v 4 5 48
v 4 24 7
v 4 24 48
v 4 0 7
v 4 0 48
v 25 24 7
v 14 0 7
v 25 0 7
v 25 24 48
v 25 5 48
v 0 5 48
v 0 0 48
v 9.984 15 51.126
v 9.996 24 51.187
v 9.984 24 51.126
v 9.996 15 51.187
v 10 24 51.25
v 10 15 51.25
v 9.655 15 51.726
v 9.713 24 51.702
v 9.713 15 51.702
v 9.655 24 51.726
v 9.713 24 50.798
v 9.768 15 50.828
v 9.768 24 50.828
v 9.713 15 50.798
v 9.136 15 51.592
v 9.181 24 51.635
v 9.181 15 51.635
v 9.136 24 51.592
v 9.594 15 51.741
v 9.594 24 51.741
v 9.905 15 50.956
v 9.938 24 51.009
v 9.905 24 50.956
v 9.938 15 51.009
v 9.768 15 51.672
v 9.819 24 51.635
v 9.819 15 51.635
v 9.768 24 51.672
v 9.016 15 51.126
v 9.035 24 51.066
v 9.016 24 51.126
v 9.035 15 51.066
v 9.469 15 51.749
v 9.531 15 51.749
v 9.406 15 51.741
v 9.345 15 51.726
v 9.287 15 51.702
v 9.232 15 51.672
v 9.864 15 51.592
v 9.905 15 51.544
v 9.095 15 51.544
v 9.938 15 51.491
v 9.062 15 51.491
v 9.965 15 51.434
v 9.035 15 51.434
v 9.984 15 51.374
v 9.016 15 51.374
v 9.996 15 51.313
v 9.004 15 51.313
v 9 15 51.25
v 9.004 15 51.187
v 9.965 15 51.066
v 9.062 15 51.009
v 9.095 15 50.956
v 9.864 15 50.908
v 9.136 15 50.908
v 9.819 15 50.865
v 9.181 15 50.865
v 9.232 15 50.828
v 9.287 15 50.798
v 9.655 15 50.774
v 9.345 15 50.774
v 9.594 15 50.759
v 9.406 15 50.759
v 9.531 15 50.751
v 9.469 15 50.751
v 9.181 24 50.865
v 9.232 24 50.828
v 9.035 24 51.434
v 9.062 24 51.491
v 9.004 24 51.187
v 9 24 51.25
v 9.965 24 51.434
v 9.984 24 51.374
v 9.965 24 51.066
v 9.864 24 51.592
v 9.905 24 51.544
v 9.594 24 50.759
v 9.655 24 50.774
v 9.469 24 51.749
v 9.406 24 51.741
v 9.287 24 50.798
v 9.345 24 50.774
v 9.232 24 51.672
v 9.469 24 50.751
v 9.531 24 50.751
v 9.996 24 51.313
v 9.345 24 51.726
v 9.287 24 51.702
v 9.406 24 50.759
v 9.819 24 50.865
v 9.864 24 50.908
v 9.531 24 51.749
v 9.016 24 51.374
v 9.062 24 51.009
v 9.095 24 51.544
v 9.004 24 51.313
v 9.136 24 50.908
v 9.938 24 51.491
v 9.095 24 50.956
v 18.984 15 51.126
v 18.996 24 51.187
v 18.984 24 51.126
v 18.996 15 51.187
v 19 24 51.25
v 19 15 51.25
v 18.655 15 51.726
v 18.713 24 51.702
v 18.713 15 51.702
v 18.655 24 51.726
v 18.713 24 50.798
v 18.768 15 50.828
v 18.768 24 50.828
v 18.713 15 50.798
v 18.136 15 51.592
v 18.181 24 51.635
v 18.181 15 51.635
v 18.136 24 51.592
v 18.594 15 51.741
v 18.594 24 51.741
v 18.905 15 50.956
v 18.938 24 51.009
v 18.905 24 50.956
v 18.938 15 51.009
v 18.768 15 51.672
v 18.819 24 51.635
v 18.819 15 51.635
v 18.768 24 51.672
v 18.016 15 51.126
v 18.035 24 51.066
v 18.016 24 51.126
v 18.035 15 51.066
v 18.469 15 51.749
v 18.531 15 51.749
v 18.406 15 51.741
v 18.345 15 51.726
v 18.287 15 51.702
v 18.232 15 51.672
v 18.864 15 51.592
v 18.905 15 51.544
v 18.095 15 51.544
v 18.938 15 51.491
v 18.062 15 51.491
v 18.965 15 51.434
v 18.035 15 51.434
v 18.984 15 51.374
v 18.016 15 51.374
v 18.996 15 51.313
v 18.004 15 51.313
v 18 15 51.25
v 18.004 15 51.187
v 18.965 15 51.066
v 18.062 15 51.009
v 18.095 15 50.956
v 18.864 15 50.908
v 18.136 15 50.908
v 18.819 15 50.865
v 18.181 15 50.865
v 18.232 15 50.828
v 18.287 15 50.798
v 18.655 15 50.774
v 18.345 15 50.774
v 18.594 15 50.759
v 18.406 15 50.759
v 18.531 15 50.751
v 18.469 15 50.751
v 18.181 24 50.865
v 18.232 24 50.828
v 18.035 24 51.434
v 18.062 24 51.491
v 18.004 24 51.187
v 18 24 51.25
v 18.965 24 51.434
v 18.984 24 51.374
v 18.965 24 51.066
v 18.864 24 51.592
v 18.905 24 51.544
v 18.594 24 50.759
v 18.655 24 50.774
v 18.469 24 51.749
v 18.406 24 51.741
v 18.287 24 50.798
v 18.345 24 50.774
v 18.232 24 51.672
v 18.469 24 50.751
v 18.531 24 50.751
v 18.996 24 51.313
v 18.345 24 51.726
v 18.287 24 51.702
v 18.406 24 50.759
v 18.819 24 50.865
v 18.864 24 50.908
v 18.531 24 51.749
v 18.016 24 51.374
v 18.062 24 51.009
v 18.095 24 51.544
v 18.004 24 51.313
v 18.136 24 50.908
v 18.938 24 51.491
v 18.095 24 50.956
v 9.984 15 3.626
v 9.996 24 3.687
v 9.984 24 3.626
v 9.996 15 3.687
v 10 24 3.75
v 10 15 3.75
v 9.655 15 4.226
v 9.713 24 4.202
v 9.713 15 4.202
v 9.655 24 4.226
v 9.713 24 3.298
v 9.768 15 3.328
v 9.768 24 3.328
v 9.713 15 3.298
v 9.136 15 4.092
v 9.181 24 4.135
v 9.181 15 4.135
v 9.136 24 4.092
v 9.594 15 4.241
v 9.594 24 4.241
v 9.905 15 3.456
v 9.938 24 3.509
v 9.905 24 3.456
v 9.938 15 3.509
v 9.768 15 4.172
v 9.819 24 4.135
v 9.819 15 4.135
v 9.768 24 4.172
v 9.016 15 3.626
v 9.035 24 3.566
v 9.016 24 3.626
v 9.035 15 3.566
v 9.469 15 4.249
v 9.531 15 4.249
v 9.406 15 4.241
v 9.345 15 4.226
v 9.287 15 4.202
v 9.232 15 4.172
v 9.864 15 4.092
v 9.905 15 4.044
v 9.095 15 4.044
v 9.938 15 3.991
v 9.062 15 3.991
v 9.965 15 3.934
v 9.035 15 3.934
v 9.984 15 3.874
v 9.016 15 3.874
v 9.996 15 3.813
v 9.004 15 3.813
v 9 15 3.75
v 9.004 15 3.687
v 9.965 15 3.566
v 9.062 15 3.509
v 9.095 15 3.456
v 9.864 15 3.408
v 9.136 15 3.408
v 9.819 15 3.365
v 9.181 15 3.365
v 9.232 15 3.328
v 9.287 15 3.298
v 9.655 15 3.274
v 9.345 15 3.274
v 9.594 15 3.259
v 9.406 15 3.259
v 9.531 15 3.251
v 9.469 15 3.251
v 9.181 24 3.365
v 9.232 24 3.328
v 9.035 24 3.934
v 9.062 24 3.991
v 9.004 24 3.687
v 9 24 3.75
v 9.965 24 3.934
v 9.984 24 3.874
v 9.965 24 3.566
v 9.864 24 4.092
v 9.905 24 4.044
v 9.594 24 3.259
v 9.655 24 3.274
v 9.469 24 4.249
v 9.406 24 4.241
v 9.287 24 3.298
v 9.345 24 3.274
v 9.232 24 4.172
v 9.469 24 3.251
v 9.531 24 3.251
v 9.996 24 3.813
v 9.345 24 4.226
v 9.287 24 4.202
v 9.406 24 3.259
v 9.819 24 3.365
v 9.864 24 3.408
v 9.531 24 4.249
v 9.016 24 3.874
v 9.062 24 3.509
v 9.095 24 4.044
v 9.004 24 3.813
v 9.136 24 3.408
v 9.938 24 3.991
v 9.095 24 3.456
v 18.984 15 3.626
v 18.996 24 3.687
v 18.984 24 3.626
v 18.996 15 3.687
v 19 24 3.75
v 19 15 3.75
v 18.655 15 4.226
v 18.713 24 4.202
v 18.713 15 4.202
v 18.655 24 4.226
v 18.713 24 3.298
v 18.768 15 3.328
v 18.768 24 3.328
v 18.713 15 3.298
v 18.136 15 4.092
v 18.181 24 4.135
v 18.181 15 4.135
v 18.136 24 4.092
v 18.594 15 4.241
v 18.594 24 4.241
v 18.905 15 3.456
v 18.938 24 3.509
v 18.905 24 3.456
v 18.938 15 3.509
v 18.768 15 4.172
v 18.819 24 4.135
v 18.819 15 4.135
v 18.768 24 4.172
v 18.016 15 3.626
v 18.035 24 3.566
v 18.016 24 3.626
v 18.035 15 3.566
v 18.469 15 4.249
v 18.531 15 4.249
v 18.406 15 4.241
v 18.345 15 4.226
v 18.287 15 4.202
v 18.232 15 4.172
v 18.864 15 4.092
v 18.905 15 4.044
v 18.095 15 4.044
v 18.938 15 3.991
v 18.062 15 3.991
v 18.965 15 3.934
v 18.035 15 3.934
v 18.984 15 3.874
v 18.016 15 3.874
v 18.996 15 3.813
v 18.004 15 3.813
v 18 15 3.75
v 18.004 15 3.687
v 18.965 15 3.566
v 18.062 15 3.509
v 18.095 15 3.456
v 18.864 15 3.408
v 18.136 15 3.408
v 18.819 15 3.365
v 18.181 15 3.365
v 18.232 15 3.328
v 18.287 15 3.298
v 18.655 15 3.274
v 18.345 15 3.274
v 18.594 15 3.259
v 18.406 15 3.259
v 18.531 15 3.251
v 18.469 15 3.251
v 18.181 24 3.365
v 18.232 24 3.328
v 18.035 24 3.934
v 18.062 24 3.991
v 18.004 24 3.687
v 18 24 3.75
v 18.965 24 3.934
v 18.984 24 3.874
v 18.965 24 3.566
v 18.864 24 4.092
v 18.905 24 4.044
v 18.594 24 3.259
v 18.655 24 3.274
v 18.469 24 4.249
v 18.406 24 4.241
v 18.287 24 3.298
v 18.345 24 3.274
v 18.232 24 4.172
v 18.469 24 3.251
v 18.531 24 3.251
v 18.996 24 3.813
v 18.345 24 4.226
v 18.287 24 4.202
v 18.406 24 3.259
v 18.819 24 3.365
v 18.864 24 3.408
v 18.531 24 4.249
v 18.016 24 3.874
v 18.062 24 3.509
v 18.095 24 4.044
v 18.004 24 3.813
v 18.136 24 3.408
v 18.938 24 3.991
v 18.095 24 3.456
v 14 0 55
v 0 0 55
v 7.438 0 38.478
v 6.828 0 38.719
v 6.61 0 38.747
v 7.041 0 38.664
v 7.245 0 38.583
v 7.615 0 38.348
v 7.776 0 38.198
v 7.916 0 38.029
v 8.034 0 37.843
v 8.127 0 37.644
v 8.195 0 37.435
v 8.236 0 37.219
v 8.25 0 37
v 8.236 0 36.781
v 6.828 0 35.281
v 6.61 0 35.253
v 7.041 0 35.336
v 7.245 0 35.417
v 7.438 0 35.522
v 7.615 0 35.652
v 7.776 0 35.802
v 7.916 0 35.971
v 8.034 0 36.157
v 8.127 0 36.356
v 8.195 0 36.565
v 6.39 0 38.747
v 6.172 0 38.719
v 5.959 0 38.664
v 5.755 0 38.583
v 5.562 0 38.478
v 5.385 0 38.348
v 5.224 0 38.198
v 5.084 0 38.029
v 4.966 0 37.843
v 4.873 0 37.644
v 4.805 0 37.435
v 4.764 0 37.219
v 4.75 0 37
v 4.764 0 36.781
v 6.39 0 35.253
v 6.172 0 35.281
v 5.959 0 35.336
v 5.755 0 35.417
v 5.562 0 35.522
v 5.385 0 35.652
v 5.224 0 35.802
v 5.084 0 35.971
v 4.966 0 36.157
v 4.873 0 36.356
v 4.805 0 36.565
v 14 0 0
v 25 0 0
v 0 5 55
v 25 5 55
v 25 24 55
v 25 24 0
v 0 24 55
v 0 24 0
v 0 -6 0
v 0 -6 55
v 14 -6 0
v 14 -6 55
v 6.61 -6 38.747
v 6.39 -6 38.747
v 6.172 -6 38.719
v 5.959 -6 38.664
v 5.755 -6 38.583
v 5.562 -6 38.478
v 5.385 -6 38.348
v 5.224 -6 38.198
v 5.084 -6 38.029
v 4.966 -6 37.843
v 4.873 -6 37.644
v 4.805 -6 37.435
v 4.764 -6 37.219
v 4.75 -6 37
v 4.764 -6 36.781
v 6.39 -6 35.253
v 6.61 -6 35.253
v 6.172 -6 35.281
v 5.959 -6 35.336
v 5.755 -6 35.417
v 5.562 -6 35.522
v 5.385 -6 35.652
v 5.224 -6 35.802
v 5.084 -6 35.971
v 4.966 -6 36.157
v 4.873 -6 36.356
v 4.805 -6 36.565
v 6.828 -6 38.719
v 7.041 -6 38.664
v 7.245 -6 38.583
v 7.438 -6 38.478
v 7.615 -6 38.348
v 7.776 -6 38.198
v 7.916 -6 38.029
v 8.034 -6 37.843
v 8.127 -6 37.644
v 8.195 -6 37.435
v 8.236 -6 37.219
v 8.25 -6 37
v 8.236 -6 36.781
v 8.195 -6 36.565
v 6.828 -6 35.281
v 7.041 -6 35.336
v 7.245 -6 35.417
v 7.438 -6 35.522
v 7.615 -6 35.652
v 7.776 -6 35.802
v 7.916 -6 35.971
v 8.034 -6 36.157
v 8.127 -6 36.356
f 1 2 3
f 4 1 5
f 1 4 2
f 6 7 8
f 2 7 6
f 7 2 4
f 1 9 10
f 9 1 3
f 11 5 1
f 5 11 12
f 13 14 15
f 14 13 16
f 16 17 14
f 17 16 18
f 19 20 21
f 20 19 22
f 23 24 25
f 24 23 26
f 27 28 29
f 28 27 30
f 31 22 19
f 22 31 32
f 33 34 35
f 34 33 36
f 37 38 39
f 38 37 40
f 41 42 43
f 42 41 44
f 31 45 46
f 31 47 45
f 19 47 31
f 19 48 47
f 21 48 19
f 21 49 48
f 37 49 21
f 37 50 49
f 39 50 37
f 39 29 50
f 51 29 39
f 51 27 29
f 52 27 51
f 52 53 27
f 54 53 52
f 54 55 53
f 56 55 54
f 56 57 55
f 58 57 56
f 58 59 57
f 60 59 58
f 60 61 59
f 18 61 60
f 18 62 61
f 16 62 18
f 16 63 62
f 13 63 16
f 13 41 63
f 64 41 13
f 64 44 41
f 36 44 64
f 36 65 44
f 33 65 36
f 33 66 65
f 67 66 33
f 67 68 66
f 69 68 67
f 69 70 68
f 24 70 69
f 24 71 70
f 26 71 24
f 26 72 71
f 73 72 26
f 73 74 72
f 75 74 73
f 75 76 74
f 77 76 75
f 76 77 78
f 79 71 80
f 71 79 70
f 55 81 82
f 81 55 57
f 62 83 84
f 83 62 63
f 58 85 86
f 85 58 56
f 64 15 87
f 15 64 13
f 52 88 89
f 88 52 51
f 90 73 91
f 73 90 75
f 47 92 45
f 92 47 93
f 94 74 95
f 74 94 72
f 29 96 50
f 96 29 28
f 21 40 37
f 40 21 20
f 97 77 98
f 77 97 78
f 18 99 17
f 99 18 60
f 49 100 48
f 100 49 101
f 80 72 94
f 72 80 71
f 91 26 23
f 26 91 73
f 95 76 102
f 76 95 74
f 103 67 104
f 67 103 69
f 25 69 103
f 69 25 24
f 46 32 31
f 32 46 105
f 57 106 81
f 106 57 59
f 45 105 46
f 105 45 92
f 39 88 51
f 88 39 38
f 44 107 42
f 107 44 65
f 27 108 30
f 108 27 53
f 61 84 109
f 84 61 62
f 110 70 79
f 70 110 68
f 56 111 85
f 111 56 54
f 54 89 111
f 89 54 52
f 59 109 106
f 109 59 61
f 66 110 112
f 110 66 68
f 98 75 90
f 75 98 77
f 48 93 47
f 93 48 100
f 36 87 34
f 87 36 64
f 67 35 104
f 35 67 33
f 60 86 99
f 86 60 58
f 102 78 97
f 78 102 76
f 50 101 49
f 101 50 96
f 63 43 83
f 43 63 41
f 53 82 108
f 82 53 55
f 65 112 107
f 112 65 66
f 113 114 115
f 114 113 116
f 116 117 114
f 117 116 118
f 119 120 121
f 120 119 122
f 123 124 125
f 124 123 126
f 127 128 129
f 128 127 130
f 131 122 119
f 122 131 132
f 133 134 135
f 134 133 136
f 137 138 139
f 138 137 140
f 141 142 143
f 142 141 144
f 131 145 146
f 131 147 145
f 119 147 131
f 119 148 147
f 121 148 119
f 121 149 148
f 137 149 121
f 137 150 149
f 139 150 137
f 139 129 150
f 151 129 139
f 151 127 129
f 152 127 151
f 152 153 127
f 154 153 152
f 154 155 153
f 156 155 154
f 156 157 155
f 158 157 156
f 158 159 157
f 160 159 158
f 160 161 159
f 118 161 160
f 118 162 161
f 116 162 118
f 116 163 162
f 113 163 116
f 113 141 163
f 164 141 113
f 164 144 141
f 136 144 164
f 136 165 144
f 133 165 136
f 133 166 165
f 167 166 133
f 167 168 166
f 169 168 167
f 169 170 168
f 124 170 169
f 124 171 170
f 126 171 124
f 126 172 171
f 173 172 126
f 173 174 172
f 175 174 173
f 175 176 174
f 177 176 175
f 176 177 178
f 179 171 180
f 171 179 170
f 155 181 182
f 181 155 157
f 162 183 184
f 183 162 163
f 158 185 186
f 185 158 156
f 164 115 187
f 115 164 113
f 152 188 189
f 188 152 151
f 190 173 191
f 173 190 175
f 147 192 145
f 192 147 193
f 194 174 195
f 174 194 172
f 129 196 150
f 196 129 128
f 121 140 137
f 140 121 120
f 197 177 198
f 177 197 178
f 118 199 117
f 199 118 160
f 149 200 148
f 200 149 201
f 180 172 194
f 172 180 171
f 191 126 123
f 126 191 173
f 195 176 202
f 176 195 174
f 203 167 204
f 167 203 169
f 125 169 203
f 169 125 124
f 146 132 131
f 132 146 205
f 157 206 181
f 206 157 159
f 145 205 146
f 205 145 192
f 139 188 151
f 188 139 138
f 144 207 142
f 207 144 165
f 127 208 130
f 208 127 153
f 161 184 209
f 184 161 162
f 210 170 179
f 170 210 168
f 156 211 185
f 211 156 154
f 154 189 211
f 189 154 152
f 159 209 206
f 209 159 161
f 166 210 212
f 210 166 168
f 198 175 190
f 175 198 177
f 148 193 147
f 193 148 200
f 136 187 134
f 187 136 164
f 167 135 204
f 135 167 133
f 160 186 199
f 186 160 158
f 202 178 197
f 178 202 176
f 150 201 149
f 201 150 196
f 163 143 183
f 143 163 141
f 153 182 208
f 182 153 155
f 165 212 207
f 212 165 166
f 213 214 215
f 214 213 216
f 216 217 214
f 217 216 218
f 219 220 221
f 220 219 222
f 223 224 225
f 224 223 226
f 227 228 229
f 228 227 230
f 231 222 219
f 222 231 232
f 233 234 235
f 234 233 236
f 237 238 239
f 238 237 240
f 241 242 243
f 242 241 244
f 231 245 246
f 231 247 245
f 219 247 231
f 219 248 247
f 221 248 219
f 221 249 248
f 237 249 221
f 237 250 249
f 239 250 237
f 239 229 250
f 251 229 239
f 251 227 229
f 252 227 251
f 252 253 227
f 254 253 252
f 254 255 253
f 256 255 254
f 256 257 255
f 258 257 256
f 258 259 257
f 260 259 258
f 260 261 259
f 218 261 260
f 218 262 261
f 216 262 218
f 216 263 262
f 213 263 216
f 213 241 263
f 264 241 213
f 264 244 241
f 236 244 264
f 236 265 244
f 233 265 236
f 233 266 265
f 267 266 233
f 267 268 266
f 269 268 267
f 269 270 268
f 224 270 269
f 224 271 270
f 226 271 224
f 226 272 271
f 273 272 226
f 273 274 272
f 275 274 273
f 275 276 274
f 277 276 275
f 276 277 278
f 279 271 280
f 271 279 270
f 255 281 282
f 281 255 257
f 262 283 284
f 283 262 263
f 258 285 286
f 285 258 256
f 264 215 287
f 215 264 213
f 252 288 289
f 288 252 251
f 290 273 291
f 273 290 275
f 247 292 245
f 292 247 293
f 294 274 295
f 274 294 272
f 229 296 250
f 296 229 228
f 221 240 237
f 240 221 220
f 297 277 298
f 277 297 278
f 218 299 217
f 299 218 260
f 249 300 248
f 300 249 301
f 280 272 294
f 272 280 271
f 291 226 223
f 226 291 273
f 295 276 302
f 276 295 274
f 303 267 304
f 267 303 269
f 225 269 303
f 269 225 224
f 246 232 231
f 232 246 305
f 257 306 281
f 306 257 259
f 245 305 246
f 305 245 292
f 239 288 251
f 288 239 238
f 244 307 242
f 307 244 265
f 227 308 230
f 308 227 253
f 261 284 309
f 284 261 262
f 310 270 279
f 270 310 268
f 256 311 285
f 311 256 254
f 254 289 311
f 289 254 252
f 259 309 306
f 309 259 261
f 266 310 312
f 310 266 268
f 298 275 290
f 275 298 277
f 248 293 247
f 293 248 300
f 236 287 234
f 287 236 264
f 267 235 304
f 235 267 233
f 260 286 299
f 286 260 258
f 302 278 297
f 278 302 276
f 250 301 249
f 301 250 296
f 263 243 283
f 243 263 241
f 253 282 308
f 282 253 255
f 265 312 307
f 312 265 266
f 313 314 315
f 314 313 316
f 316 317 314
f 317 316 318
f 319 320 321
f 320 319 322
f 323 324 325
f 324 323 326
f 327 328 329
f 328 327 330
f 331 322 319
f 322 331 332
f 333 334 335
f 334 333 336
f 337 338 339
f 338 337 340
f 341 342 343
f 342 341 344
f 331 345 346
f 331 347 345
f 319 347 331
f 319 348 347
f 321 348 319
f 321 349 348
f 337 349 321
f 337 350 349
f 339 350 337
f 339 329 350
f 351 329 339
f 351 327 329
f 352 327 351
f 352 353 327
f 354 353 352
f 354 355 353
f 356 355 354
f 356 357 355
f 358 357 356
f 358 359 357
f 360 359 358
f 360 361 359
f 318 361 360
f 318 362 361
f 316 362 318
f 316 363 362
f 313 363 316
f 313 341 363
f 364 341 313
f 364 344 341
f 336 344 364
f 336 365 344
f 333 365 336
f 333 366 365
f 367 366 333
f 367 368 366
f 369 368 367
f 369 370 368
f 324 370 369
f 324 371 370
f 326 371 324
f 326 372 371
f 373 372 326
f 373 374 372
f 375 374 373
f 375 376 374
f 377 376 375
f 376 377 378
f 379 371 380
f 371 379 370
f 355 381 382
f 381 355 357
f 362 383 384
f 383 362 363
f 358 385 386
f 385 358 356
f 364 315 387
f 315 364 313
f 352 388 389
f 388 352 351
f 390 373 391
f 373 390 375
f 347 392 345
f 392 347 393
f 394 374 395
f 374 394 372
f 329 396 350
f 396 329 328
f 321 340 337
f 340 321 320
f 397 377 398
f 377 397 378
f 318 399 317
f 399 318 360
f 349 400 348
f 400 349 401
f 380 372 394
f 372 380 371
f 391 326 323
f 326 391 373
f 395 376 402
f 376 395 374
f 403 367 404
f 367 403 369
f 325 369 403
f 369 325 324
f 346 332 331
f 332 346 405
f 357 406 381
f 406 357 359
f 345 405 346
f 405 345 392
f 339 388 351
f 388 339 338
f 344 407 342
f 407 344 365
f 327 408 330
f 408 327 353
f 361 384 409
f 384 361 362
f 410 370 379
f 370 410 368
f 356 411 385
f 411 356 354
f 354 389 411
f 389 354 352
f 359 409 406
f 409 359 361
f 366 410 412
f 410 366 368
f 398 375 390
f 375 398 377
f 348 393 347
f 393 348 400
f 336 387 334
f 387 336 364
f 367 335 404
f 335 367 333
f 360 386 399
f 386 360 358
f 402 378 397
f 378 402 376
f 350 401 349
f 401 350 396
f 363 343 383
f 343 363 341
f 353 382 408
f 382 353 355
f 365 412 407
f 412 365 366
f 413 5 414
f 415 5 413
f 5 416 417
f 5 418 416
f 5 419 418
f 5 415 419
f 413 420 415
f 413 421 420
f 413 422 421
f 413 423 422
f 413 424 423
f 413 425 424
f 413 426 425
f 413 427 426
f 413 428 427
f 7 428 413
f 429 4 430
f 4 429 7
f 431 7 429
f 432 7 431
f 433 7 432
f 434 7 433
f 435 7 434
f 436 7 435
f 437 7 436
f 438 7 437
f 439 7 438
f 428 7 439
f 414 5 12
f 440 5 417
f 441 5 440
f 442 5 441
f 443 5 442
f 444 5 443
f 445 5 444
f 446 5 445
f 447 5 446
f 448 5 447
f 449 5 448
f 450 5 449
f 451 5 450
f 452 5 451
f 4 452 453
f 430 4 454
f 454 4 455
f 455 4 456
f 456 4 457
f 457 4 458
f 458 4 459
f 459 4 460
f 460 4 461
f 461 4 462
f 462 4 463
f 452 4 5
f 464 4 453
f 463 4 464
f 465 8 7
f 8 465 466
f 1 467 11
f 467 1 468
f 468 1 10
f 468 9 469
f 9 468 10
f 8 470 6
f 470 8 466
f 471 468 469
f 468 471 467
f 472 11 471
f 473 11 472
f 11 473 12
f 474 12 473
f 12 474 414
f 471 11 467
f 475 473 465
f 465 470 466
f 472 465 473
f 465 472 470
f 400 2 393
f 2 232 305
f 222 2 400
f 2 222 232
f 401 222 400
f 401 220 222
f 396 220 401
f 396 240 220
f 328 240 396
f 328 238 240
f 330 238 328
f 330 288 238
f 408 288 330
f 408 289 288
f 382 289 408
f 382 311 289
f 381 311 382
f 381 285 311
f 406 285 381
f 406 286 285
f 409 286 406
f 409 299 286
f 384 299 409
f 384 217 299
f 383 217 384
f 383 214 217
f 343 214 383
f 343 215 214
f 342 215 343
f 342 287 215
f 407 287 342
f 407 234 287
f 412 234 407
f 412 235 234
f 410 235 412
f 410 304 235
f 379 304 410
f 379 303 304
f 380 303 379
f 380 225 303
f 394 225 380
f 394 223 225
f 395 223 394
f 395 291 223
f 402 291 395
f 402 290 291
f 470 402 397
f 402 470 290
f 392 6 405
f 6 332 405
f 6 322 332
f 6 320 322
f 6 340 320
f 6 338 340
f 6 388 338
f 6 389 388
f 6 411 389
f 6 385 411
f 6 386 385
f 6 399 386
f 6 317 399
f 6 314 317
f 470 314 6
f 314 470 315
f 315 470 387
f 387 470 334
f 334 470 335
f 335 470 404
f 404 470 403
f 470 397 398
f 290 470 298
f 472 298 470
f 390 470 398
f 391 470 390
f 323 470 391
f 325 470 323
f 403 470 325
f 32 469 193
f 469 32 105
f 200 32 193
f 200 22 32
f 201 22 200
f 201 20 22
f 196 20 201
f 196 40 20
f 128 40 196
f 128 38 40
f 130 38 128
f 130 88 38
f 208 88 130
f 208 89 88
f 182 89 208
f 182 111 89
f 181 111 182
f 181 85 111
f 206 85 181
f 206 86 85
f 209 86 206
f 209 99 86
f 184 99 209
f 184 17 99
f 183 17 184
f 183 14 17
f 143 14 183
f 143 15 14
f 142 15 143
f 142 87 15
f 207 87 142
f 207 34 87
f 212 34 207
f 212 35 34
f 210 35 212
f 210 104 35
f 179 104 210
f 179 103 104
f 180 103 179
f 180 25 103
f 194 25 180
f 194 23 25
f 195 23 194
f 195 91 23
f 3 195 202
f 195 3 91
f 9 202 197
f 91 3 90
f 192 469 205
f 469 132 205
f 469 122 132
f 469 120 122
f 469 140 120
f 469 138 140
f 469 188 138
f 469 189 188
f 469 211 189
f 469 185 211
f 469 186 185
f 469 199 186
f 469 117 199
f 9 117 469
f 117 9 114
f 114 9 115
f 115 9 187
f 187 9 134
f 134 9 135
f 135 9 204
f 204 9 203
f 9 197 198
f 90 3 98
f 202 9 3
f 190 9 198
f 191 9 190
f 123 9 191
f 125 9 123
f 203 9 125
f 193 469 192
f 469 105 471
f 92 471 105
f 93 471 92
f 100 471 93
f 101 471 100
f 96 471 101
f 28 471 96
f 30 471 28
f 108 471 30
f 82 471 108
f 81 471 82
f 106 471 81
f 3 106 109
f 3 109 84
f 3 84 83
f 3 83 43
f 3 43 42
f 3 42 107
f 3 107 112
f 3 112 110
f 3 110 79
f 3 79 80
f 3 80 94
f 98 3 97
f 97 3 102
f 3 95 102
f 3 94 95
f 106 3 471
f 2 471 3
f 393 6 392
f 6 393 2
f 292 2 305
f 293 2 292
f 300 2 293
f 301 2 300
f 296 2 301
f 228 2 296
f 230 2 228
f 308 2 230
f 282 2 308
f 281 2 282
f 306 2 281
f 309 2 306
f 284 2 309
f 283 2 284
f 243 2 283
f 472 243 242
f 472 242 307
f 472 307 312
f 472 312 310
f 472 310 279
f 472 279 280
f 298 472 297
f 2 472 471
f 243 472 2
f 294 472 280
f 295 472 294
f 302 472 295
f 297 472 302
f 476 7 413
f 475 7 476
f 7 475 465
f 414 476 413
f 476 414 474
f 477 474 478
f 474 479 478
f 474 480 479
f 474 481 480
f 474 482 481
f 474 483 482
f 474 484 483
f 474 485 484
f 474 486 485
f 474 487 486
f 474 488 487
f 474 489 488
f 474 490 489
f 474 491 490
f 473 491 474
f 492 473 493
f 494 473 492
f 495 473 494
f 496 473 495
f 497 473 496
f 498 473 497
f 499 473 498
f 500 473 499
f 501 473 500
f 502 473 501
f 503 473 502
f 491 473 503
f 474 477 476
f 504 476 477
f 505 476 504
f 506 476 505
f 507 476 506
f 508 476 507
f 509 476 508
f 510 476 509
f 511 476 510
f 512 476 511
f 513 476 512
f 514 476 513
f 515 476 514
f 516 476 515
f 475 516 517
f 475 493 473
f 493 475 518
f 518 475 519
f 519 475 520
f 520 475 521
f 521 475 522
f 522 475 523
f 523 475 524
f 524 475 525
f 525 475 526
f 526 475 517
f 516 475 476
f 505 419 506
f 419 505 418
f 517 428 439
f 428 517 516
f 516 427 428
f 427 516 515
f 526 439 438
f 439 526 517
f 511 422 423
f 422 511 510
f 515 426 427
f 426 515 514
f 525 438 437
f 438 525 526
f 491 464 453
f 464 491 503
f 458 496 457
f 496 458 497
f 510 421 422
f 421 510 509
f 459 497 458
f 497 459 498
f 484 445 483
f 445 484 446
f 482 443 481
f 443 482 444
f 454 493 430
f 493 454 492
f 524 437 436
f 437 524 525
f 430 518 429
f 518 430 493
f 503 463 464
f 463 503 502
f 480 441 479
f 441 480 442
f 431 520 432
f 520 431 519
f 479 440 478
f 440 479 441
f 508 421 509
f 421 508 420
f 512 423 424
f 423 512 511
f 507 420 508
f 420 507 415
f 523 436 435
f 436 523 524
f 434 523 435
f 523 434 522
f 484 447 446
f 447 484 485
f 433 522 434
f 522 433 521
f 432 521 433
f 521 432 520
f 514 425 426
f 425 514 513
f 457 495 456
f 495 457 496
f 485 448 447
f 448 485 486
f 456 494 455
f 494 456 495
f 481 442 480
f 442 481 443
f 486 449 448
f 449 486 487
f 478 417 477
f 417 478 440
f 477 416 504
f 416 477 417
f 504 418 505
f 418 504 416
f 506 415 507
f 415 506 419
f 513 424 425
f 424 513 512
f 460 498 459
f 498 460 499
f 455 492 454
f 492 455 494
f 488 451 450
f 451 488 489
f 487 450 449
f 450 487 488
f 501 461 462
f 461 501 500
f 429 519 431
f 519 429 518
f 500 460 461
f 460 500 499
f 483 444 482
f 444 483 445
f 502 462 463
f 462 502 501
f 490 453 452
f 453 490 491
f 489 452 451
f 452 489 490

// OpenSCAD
// file: ../../Modèles/Servo.scad
module vis_servo(l) {
    cylinder(d=1,5, h=10);
}

module servo() {
    translate([0,0,0])       cube([20,41,36]);
    translate([0,-6.5,23.5]) cube([20,54,10]);

	translate([ 5.5,  -3.25,14]) vis_servo();
	translate([14.5,  -3.25,14]) vis_servo();
	translate([ 5.5,41+3.25,14]) vis_servo();
	translate([14.5,41+3.25,14]) vis_servo();

    translate([10,10,36]) cylinder(d=15, h=2);
}
// main file
$fn=50;

include <../../Modèles/Servo.scad>


difference() {
	cube([25, 24, 55]);
	union() {

		translate([4,1,48])
            rotate([-90,0,0])servo();
		translate([23,0,7]) cube([21,25,41]);
		translate([4,0,7])  cube([21,5,41]);
		translate([0,0,48]) cube([25,5,7]);
	}
}

difference() {
	translate([0,-6,0]) cube([14, 6, 55]);
	translate([4+2.5,-20,30+7])
        rotate([-90,0,0])
        #cylinder(100, d=3.5);
}
